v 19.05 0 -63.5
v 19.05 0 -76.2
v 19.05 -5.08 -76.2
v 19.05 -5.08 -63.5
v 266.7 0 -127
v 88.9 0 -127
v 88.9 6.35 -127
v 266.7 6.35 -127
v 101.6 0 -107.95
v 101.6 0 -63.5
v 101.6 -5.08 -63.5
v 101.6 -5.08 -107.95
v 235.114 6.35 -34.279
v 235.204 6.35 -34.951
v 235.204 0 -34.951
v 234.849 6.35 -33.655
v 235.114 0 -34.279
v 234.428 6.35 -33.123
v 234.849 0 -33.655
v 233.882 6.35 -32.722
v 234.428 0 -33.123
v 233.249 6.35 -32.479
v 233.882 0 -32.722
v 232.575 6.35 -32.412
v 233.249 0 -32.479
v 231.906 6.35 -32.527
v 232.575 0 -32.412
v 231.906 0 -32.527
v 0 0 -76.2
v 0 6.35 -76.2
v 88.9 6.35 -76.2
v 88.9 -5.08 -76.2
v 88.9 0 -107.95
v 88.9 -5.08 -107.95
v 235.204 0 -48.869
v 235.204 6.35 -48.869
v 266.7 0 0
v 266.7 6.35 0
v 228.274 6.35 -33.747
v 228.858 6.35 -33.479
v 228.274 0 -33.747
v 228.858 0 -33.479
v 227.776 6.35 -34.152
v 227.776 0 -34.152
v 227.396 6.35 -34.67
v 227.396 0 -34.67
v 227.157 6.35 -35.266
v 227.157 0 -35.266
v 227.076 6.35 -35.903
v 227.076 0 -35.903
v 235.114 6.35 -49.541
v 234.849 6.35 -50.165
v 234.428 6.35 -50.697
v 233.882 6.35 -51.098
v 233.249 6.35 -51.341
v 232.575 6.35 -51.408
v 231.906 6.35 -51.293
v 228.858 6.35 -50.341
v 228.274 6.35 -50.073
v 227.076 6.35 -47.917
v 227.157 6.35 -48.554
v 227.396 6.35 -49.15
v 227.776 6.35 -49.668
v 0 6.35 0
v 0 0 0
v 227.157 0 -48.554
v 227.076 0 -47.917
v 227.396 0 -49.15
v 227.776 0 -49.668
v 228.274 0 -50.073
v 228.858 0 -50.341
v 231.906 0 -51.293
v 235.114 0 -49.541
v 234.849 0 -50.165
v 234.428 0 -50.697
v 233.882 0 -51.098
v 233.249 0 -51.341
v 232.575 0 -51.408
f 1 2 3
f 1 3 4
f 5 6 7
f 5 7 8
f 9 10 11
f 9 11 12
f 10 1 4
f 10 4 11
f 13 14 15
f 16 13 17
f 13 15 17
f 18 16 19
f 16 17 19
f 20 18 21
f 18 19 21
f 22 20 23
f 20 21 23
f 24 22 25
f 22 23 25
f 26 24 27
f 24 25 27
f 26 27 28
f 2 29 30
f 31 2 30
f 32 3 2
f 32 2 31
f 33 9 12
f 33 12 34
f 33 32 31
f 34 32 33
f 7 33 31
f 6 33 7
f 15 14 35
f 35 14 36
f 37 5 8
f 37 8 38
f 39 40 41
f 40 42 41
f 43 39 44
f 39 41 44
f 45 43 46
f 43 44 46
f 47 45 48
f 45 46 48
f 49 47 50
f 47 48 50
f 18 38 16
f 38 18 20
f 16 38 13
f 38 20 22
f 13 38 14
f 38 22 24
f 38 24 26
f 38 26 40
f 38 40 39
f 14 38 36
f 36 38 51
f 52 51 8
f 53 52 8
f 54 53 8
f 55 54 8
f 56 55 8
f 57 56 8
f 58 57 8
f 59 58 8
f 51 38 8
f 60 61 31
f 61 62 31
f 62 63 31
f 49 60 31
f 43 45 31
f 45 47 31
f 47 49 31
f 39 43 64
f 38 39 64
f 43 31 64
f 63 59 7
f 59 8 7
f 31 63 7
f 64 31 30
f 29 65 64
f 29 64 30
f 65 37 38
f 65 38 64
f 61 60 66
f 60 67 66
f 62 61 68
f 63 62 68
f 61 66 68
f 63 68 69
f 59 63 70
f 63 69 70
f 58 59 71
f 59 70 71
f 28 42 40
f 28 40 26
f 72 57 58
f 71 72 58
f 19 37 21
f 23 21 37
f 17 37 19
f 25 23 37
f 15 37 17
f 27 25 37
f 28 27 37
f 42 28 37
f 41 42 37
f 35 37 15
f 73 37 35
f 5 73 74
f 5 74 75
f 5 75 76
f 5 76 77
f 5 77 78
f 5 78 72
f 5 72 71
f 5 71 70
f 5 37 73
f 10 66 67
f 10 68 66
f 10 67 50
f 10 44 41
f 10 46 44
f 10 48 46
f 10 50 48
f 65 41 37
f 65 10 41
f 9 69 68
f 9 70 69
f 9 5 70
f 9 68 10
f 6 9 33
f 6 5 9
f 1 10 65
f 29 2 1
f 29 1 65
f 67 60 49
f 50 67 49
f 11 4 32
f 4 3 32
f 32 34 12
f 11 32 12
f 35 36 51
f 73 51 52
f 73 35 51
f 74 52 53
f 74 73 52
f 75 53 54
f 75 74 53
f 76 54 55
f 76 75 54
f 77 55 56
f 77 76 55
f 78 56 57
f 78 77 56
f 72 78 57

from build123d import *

# Parameters (mm, degrees)
BOSS_EXTRUDE1_DEPTH = 6.35
BOSS_EXTRUDE2_DEPTH = 11.43
CUT_EXTRUDE1_DEPTH  = 12.7
FILLET1_R           = 2.54


with BuildPart() as part:
    # Sketch1 → Boss-Extrude1 (new body)
    with BuildSketch(Plane(origin=(0, 0, 0), x_dir=(1, 0, 0), z_dir=(0, 1, 0))):
        Polygon((0, 0), (0, 76.2), (88.9, 76.2), (88.9, 127), (266.7, 127), (266.7, 0), align=None)
    extrude(amount=BOSS_EXTRUDE1_DEPTH)

    # Sketch2 → Boss-Extrude2 (add)
    with BuildSketch(Plane(origin=(0, 6.35, 0), x_dir=(1, 0, 0), z_dir=(0, 1, 0))):
        Polygon((19.05, 63.5), (101.6, 63.5), (101.6, 107.95), (88.9, 107.95), (88.9, 76.2), (19.05, 76.2), align=None)
    extrude(amount=-BOSS_EXTRUDE2_DEPTH)

    # Sketch3 → Cut-Extrude1 (cut)
    with BuildSketch(Plane(origin=(0, 6.35, 0), x_dir=(1, 0, 0), z_dir=(0, 1, 0))):
        Polygon((235.204, 31.496), (235.204, 52.324), (227.076, 49.784), (227.076, 34.036), align=None)
    extrude(amount=-CUT_EXTRUDE1_DEPTH, mode=Mode.SUBTRACT)

    # Fillet1
    fillet1_edges = [part.edges().sort_by_distance(p)[0] for p in [
        (235.204, 3.175, -31.496),
        (227.076, 3.175, -34.036),
        (227.076, 3.175, -49.784),
        (235.204, 3.175, -52.324),
    ]]
    fillet(fillet1_edges, radius=FILLET1_R)


solid = part.part
